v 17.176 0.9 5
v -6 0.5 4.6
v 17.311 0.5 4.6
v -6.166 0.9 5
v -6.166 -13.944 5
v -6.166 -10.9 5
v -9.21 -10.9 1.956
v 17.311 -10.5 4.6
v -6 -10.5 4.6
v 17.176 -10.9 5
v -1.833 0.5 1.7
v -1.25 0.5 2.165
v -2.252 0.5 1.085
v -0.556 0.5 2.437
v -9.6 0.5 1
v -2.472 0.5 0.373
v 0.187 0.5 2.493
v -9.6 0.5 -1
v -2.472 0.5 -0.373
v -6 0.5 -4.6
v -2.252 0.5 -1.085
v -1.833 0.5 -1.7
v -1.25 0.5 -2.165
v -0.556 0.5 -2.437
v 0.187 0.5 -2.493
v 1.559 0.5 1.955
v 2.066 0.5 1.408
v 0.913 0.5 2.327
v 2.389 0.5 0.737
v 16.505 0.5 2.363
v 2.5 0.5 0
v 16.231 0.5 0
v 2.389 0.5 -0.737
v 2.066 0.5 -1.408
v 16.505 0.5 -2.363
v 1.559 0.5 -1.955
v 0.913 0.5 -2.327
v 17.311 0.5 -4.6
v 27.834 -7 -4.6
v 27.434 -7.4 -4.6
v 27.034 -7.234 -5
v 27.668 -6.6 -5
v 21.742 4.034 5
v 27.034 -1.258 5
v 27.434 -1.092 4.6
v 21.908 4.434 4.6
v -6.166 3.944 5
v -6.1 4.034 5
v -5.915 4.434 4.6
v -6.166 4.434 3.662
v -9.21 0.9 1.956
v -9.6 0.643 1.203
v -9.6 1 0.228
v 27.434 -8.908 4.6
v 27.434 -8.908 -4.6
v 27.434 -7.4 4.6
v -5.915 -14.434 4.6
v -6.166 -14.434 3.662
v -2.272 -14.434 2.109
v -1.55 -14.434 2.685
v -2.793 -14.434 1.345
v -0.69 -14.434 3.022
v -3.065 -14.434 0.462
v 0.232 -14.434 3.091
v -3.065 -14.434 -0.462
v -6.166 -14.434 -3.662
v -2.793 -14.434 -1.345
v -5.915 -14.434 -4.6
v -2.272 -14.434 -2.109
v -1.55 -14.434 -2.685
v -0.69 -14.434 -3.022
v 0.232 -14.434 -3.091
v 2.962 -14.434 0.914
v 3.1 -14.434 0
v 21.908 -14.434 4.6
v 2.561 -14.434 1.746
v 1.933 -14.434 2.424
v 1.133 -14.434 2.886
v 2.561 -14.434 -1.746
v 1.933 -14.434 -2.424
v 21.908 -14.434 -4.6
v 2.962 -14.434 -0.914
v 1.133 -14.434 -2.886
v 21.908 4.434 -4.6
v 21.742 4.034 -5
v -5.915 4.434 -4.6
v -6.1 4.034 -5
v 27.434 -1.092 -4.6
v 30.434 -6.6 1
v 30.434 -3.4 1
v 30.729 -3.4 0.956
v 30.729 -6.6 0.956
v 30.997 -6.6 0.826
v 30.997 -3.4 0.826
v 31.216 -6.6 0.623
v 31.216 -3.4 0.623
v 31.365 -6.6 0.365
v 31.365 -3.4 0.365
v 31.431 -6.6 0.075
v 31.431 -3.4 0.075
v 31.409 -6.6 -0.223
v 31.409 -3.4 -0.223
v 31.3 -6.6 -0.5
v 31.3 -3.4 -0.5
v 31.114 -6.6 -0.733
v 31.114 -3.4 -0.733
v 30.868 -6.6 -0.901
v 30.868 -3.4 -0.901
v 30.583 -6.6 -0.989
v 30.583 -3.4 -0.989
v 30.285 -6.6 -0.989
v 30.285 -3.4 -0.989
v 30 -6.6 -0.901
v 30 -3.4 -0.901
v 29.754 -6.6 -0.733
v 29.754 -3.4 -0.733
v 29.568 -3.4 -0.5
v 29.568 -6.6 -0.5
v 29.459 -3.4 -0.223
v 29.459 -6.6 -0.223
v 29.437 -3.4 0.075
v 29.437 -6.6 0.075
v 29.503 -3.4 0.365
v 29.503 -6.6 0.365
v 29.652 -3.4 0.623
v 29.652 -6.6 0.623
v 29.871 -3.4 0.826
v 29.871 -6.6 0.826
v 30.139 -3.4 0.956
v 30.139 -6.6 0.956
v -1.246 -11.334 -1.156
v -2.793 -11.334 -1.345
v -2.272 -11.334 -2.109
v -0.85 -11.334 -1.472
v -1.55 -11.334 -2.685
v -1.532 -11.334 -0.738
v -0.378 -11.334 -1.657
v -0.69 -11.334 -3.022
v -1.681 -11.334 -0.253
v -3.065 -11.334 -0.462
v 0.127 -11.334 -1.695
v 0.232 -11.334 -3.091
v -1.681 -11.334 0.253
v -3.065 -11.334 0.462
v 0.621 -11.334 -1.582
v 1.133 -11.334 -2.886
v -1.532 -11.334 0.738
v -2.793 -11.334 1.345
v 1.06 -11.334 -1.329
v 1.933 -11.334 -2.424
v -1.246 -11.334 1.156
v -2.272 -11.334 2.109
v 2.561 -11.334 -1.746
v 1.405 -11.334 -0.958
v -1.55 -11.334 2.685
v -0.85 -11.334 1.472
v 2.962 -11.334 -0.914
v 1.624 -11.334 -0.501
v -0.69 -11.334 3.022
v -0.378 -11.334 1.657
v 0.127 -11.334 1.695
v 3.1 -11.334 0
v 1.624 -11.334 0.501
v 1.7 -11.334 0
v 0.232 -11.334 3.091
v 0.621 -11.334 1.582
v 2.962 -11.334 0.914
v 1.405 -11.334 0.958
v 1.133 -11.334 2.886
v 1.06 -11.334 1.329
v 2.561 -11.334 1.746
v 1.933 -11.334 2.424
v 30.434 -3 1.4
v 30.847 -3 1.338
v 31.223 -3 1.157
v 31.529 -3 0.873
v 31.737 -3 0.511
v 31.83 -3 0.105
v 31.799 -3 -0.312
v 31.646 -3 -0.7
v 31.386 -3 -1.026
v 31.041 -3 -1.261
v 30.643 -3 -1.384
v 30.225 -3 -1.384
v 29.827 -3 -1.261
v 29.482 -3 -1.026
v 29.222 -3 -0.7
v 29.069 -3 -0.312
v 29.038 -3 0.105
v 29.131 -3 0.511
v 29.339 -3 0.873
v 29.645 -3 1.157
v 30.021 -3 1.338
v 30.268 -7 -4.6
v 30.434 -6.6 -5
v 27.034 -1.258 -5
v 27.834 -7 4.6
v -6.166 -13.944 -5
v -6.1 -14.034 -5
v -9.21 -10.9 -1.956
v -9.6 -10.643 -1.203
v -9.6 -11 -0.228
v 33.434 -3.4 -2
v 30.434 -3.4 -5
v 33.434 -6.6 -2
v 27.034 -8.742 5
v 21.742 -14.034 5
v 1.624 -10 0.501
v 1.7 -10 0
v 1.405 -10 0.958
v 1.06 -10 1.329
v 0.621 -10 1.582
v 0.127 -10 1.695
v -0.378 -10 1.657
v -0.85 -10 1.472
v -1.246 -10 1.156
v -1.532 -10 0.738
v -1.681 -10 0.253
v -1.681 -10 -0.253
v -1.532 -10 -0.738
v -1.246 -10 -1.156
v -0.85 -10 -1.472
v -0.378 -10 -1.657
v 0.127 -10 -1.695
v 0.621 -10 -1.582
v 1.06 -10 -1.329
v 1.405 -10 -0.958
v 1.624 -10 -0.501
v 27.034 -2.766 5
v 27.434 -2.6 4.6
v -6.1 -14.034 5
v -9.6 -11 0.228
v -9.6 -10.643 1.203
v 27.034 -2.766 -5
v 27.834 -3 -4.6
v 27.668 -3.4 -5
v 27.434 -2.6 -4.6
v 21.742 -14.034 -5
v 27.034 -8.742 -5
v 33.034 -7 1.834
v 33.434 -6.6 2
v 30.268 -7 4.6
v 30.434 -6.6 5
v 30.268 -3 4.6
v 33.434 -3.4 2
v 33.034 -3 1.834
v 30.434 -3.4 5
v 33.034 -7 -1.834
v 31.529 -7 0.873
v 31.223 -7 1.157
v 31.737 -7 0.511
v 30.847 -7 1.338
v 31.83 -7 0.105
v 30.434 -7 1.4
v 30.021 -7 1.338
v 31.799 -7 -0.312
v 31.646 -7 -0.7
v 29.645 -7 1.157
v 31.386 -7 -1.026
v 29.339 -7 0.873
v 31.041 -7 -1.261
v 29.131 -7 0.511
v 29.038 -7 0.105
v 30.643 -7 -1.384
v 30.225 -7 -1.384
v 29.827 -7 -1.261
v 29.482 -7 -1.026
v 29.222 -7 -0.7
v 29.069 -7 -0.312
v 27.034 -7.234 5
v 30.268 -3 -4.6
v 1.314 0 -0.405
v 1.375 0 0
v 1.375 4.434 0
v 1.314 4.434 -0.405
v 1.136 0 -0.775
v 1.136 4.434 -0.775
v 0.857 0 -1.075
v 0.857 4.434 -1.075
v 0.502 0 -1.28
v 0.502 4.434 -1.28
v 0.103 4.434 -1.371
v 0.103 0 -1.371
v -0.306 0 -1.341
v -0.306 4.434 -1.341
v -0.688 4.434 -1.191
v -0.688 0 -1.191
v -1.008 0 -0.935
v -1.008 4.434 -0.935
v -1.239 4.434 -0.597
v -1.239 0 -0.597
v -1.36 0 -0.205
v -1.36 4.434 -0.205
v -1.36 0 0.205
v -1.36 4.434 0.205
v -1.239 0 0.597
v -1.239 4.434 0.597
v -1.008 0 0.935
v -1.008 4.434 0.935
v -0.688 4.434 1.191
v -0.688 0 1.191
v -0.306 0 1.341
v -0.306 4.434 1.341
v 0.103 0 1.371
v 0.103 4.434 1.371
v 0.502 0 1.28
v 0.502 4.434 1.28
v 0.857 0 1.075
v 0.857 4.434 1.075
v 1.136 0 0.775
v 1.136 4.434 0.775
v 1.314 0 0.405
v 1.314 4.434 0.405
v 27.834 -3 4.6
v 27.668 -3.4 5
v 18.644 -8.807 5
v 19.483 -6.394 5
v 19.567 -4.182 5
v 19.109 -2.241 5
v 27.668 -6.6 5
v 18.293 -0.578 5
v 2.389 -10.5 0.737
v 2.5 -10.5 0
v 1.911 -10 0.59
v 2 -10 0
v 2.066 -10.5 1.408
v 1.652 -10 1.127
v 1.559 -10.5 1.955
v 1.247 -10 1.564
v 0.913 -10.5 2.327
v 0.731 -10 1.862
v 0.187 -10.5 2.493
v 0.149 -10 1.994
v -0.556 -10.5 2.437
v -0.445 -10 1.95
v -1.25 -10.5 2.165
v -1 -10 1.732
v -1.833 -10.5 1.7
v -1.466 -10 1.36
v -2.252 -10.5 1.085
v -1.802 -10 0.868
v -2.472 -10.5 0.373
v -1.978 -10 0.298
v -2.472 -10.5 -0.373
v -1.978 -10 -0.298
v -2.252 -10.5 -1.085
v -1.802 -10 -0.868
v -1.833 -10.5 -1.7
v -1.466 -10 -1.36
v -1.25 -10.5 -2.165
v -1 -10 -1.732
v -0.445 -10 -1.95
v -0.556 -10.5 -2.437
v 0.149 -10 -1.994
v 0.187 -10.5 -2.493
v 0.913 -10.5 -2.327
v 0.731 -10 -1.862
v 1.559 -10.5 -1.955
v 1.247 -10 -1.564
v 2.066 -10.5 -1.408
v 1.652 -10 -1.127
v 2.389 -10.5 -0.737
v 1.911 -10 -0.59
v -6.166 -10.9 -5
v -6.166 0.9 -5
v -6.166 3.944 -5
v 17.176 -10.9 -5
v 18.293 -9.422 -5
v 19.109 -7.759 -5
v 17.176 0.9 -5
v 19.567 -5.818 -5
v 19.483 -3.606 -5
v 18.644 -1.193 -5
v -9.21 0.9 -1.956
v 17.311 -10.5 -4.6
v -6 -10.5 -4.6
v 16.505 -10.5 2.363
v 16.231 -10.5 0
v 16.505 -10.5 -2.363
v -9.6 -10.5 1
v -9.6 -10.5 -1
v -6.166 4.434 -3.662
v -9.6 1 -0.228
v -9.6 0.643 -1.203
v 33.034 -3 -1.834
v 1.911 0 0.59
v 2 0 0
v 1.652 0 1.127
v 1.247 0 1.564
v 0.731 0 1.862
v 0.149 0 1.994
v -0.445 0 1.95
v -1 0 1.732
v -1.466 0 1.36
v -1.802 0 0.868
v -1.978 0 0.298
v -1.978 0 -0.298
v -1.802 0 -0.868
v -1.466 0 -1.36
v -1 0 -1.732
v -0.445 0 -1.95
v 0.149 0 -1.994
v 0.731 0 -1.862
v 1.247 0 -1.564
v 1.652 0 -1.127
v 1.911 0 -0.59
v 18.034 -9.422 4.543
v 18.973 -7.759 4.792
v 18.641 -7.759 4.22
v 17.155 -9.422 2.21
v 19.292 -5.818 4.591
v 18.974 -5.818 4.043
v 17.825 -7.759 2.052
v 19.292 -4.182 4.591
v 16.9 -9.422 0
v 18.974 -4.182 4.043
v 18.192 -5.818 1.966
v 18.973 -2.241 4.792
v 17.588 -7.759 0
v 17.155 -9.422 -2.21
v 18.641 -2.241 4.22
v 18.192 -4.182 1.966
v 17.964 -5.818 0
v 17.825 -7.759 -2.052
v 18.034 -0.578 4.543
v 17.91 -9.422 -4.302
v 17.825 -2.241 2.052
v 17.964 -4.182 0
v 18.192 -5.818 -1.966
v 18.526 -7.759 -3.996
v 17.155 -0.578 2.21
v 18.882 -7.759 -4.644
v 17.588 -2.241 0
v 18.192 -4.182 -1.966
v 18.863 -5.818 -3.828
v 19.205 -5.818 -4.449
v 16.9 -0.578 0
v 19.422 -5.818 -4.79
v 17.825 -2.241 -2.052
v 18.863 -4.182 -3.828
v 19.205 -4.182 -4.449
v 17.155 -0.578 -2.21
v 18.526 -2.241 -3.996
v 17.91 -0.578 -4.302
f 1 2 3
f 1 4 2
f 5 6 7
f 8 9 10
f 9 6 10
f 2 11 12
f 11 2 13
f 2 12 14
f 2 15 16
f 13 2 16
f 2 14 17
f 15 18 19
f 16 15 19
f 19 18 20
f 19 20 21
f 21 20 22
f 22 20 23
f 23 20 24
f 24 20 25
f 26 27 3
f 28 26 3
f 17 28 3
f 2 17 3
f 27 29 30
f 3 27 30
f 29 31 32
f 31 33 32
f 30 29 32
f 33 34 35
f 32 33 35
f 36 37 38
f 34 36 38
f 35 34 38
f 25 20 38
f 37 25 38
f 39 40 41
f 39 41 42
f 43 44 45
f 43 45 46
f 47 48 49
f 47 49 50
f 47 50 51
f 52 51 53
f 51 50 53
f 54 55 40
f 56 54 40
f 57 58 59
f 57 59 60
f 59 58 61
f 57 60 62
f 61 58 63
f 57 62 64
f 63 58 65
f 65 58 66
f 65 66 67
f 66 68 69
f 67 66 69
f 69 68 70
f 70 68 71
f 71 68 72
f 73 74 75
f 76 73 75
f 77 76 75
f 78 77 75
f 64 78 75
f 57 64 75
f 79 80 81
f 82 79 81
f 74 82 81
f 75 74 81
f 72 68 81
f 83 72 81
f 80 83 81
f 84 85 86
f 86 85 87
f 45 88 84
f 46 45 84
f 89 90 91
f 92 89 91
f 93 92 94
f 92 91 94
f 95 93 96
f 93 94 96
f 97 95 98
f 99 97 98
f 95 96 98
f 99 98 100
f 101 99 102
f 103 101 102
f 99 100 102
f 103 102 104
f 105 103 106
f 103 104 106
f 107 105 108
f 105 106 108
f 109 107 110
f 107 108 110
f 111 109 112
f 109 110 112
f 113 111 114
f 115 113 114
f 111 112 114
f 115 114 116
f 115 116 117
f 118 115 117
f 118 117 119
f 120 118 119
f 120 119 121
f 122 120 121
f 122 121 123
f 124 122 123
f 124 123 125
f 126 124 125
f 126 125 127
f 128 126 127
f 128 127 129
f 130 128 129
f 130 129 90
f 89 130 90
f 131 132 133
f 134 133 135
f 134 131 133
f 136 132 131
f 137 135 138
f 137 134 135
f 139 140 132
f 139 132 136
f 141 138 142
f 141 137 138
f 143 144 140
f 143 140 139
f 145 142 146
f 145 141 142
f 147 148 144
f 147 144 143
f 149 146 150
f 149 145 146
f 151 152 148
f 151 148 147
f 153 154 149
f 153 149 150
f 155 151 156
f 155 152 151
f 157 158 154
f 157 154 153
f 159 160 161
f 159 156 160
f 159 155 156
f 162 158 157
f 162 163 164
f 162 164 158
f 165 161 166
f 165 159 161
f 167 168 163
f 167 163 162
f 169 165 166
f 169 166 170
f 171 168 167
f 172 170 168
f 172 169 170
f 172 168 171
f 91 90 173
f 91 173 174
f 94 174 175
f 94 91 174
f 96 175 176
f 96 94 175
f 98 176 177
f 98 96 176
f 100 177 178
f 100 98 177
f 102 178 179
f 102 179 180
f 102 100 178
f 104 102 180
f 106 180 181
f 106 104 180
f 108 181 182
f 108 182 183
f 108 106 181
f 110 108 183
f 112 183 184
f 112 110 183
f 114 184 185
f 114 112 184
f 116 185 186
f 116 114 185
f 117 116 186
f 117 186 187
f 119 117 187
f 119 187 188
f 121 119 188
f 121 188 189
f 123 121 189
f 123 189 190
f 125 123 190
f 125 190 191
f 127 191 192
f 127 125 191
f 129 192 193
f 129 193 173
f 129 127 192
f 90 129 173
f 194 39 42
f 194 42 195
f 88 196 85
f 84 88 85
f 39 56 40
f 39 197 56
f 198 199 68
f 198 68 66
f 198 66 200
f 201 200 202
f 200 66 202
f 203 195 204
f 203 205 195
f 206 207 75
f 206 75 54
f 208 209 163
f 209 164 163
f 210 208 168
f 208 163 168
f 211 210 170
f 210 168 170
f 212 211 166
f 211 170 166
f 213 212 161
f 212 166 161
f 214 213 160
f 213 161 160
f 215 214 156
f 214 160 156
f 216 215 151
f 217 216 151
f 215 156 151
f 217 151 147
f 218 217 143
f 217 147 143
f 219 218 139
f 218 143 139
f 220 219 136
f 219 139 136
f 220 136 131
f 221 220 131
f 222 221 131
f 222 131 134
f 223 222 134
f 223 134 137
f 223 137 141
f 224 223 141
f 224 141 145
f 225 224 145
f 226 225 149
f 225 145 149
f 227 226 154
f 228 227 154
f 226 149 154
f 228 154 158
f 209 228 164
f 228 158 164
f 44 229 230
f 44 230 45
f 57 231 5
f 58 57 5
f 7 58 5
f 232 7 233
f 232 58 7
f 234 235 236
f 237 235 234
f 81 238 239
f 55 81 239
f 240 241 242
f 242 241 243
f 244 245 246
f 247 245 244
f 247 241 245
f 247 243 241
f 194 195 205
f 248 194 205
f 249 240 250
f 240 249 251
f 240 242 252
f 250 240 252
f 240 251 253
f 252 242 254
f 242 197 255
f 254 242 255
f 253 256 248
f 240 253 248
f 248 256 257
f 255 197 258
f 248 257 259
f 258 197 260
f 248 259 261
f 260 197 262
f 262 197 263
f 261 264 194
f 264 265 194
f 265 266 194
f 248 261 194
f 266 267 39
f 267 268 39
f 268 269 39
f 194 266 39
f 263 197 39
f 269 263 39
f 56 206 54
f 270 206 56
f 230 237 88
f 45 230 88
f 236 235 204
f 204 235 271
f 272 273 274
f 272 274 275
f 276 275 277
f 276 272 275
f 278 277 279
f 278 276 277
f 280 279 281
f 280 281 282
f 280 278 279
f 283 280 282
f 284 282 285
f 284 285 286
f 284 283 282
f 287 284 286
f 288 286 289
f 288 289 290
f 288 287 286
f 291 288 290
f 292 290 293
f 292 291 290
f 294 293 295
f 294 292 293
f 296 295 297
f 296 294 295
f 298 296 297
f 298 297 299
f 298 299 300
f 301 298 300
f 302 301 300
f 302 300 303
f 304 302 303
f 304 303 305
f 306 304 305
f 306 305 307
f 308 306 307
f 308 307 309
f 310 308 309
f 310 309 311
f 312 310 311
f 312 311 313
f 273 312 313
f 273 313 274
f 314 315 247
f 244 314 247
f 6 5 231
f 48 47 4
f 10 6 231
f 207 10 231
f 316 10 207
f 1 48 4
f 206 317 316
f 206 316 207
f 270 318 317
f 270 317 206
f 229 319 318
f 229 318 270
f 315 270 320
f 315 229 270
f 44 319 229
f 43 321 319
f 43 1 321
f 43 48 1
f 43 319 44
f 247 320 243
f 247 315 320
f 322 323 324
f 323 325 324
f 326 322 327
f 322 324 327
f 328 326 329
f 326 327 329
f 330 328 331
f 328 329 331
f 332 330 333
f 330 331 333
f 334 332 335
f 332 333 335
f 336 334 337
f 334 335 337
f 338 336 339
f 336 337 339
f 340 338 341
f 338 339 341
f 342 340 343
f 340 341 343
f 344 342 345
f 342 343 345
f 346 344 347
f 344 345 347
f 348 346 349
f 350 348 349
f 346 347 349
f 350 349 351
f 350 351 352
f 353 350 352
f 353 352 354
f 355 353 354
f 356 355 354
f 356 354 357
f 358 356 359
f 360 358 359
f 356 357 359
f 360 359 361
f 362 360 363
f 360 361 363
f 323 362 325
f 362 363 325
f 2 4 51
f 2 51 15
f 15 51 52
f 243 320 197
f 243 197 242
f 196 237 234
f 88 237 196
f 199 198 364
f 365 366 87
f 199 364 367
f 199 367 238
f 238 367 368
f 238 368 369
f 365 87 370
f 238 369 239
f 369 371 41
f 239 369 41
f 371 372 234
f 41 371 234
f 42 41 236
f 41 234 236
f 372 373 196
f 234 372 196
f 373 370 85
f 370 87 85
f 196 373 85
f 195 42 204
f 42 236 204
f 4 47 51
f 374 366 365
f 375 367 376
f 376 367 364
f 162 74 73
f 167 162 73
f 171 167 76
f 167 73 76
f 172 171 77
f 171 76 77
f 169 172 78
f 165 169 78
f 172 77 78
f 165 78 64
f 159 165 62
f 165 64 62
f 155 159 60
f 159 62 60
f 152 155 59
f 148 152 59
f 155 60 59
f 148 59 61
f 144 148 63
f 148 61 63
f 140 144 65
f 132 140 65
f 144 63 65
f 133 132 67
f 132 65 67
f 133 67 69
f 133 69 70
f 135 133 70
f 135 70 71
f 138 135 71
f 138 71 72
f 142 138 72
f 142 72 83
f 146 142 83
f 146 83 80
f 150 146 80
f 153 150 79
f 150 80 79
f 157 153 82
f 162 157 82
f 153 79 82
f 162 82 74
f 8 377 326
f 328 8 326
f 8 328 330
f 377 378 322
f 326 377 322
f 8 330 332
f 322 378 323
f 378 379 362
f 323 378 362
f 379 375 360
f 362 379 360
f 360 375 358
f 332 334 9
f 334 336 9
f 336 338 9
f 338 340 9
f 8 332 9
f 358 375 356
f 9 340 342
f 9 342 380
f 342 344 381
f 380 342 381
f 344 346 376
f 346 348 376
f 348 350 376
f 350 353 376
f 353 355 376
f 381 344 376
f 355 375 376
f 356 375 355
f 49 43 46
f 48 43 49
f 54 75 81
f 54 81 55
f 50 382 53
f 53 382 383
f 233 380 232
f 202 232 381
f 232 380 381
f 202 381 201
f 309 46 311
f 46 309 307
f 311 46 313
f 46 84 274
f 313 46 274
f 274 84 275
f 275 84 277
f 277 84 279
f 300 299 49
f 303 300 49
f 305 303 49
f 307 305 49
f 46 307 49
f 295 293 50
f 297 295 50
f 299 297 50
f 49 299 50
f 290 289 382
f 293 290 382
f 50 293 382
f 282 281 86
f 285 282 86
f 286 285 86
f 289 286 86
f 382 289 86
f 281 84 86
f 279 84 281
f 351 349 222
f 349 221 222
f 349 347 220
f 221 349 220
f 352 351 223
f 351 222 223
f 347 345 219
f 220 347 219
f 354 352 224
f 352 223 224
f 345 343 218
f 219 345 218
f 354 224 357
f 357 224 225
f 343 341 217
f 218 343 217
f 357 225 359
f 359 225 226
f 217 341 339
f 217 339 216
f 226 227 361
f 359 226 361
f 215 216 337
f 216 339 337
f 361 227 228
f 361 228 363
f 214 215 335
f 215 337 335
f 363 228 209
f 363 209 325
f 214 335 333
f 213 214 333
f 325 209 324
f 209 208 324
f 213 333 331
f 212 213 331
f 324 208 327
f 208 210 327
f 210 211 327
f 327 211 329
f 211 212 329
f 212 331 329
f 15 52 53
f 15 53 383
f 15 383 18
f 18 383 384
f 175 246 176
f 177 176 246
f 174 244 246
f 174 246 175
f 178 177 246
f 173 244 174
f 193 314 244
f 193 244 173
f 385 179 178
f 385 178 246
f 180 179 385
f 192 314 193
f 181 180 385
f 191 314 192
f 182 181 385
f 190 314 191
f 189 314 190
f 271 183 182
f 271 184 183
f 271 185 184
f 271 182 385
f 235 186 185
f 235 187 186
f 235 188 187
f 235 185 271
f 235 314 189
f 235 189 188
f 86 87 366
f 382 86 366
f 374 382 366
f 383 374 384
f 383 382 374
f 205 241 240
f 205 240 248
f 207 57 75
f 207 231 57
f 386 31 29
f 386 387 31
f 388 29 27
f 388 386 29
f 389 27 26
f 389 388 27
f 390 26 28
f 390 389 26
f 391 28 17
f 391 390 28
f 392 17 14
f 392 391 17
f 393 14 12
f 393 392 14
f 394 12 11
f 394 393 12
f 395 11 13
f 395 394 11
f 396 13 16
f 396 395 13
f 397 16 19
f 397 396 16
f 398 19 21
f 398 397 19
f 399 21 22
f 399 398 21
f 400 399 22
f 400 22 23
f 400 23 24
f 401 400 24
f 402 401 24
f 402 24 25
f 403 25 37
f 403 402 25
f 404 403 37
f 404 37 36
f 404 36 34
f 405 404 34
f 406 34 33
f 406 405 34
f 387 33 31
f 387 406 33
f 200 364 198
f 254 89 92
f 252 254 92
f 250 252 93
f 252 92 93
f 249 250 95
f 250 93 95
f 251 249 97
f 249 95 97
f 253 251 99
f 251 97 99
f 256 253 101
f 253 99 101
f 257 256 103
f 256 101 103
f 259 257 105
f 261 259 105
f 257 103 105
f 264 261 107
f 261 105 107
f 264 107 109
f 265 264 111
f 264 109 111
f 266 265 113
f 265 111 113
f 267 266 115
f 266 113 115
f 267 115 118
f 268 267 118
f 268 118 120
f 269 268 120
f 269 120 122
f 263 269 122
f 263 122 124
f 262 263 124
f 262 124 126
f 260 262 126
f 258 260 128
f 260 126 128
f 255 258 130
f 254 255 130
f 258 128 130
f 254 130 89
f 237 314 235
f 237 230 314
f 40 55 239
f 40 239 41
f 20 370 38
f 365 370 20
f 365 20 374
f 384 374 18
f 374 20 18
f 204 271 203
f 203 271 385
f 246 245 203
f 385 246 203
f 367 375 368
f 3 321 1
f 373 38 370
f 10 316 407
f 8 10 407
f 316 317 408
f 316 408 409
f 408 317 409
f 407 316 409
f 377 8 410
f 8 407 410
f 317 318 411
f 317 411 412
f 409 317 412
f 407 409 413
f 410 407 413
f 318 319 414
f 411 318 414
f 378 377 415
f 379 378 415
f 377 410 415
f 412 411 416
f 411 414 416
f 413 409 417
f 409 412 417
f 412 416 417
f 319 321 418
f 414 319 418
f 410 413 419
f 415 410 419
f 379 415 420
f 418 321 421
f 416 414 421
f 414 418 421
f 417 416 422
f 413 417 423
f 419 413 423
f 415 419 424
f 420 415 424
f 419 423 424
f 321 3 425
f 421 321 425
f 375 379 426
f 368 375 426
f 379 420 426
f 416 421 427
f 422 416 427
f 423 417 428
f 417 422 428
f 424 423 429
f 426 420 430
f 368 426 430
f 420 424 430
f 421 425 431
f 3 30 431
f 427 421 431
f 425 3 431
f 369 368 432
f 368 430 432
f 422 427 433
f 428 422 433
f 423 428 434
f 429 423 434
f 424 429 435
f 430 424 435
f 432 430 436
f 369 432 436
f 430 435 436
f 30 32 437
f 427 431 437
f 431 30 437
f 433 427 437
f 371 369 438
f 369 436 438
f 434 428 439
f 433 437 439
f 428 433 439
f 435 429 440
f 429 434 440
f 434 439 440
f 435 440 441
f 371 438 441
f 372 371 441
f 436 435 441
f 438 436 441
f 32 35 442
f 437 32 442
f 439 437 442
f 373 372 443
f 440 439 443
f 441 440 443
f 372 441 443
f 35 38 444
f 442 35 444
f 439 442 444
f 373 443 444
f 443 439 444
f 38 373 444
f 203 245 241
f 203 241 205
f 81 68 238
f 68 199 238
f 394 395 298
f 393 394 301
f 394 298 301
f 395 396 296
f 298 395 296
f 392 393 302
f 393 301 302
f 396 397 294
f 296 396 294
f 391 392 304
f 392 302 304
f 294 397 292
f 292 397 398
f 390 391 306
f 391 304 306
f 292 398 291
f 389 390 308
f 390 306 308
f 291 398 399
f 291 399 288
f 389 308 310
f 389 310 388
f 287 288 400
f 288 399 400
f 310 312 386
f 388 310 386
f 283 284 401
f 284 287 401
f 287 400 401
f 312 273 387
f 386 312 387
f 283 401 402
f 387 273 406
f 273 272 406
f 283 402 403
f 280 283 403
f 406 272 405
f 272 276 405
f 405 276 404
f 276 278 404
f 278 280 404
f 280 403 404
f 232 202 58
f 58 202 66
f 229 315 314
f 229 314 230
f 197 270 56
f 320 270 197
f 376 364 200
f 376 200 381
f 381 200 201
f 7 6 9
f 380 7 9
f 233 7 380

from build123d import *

# Parameters (mm, degrees)
BOSS_EXTRUDE1_DEPTH      = 5
BOSS_EXTRUDE1_DEPTH_BACK = 5
CUT_EXTRUDE1_DEPTH       = 34.669323141
CUT_EXTRUDE1_DEPTH_BACK  = 34.669323141
SKETCH2_R                = 1.375
CUT_EXTRUDE2_REACH       = 35.669
SKETCH3_R                = 1.7
SKETCH4_R                = 3.1
CUT_EXTRUDE3_DEPTH       = 3.1
CHAMFER1_SIZE            = 3.43398
CUT_EXTRUDE4_START       = -5
CUT_EXTRUDE4_DEPTH       = 10
CHAMFER2_SIZE            = 0.4
CHAMFER3_SIZE            = 0.4
CHAMFER3_EDGE_2_SIZE     = 0.4
CHAMFER3_EDGE_2_SIZE2    = 1.092820323
CHAMFER3_EDGE_3_SIZE     = 0.4
CHAMFER3_EDGE_3_SIZE2    = 1.092820323
CHAMFER3_EDGE_4_SIZE     = 0.4
CHAMFER3_EDGE_5_SIZE     = 0.4
CHAMFER3_EDGE_6_SIZE     = 0.4
CHAMFER3_EDGE_7_SIZE     = 0.4
CHAMFER3_EDGE_7_SIZE2    = 1.092820323
CHAMFER3_EDGE_8_SIZE     = 0.4
CHAMFER3_EDGE_8_SIZE2    = 1.092820323
SKETCH9_W                = 10
SKETCH9_H                = 4
BOSS_EXTRUDE3_DEPTH      = 6
CUT_EXTRUDE5_REACH       = 37.687
SKETCH10_R               = 1
CHAMFER4_SIZE            = 0.4
CHAMFER5_SIZE            = 3
CHAMFER6_SIZE            = 0.4
MOVE_FACE1_OUTLINE_R     = 1.7
MOVE_FACE1_OUTLINE_R_2   = 1.375
MOVE_FACE1_DEPTH         = 0.5


# Read off the part's stored shape, not the designer's step: Move Face1
with BuildPart() as part:
    # Sketch1 → Boss-Extrude1 (new, two sides: drawn at the far end of the back side and taken through both)
    with BuildSketch(Plane.XY.offset(-BOSS_EXTRUDE1_DEPTH_BACK)):
        Polygon((27.433981132, -1.092317068), (21.907682932, 4.433981132), (-6.166018868, 4.433981132), (-9.6, 1), (-9.6, 0.5), (11.1, 0.5), (11.1, -10.5), (-9.6, -10.5), (-9.6, -11), (-6.166018868, -14.433981132), (21.907682932, -14.433981132), (27.433981132, -8.907682932), align=None)
    extrude(amount=BOSS_EXTRUDE1_DEPTH + BOSS_EXTRUDE1_DEPTH_BACK)

    # Sketch2 → Cut-Extrude1 (cut, two sides: drawn at the far end of the back side and taken through both)
    with BuildSketch(Plane.XZ.offset(14.433981132).offset(-CUT_EXTRUDE1_DEPTH_BACK)):
        Circle(SKETCH2_R)
    extrude(amount=CUT_EXTRUDE1_DEPTH + CUT_EXTRUDE1_DEPTH_BACK, mode=Mode.SUBTRACT)

    # Sketch3 → Cut-Extrude2 (cut, up to next)
    with BuildSketch(Plane.XZ.offset(14.433981132), mode=Mode.PRIVATE) as cut_extrude2_sk1:
        Circle(SKETCH3_R)
    cut_extrude2_tool1 = extrude(cut_extrude2_sk1.sketch, amount=-CUT_EXTRUDE2_REACH, mode=Mode.PRIVATE) & part.part
    add(cut_extrude2_tool1.solids().sort_by_distance((0, -14.433981, 0))[0], mode=Mode.SUBTRACT)

    # Sketch4 → Cut-Extrude3 (cut)
    with BuildSketch(Plane.XZ.offset(14.433981132)):
        Circle(SKETCH4_R)
    extrude(amount=-CUT_EXTRUDE3_DEPTH, mode=Mode.SUBTRACT)

    # Sketch5 → Revolve1 (revolve)
    with BuildSketch(Plane.XY, mode=Mode.PRIVATE) as revolve1_sk:
        Polygon((-1.7, -10.5), (-2.5, -10.5), (-2, -10), (-1.7, -10), align=None)
    revolve1 = revolve(revolve1_sk.sketch.rotate(Axis((0, 4.433981132, 0), (0, -1, 0)), 180), axis=Axis((0, 4.433981132, 0), (0, -1, 0)))

    # Mirror1: Revolve1 across plane
    add(revolve1.mirror(Plane(origin=(0, -5, 0), x_dir=(0, 0, 1), z_dir=(0, -1, 0))))

    # Chamfer1
    chamfer1_edges = [part.edges().sort_by_distance(p)[0] for p in [
        (-9.6, 0.75, 5),
        (-9.6, 0.75, -5),
        (-9.6, -10.75, -5),
        (-9.6, -10.75, 5),
    ]]
    chamfer(chamfer1_edges, length=CHAMFER1_SIZE)

    # Sketch7 → Cut-Extrude4 (cut)
    with BuildSketch(Plane.XY.offset(CUT_EXTRUDE4_START)):
        with BuildLine():
            Line((11.1, 0.5), (11.1, -10.5))
            Line((11.1, -10.5), (16.230873726, -10.5))
            ThreePointArc((16.230873726, -10.5), (18, -5), (16.230873726, 0.5))
            Line((16.230873726, 0.5), (11.1, 0.5))
        make_face()
    extrude(amount=CUT_EXTRUDE4_DEPTH, mode=Mode.SUBTRACT)

    # Sketch7<2> → Cut-Revolve3 (revolve, cut)
    with BuildSketch(Plane.XY):
        with BuildLine():
            Line((11.1, 0.5), (11.1, -10.5))
            Line((11.1, -10.5), (16.230873726, -10.5))
            ThreePointArc((16.230873726, -10.5), (18, -5), (16.230873726, 0.5))
            Line((16.230873726, 0.5), (11.1, 0.5))
        make_face()
    revolve(axis=Axis((26.566018868, 5.861349866, 0), (0, -1, 0)), mode=Mode.SUBTRACT)

    # Chamfer2
    chamfer2_edges = [part.edges().sort_by_distance(p)[0] for p in [
        (5.677410985, -10.5, -5),
        (7.870832032, -14.433981132, -5),
        (24.670832032, -11.670832032, -5),
        (5.677410985, -10.5, 5),
        (7.870832032, -14.433981132, 5),
        (24.670832032, -11.670832032, 5),
        (24.670832032, 1.670832032, 5),
        (24.670832032, 1.670832032, -5),
        (7.870832032, 4.433981132, 5),
        (7.870832032, 4.433981132, -5),
        (5.677410985, 0.5, 5),
        (5.677410985, 0.5, -5),
    ]]
    chamfer(chamfer2_edges, length=CHAMFER2_SIZE)

    # Chamfer3
    chamfer3_edges = [part.edges().sort_by_distance(p)[0] for p in [
        (-8.08301, 0.5, 3.08301),
    ]]
    chamfer(chamfer3_edges, length=CHAMFER3_SIZE)

    # Chamfer3 edge 2
    chamfer3_edge_2_edges = [part.edges().sort_by_distance(p)[0] for p in [
        (-7.983009717, 2.616990283, 3.183010283),
    ]]
    chamfer3_edge_2_side = [part.faces().sort_by_distance(p)[0] for p in [
        (-7.458377293, 1.830066089, 3.707642707),
    ]]
    chamfer(chamfer3_edge_2_edges, length=CHAMFER3_EDGE_2_SIZE, length2=CHAMFER3_EDGE_2_SIZE2, reference=chamfer3_edge_2_side[0])

    # Chamfer3 edge 3
    chamfer3_edge_3_edges = [part.edges().sort_by_distance(p)[0] for p in [
        (-7.983009717, 2.616990283, -3.183010283),
    ]]
    chamfer3_edge_3_side = [part.faces().sort_by_distance(p)[0] for p in [
        (-7.458377293, 1.830066089, -3.707642707),
    ]]
    chamfer(chamfer3_edge_3_edges, length=CHAMFER3_EDGE_3_SIZE, length2=CHAMFER3_EDGE_3_SIZE2, reference=chamfer3_edge_3_side[0])

    # Chamfer3 edge 4
    chamfer3_edge_4_edges = [part.edges().sort_by_distance(p)[0] for p in [
        (-8.08301, 0.5, -3.08301),
    ]]
    chamfer(chamfer3_edge_4_edges, length=CHAMFER3_EDGE_4_SIZE)

    # Chamfer3 edge 5
    chamfer3_edge_5_edges = [part.edges().sort_by_distance(p)[0] for p in [
        (-8.08301, -10.5, 3.08301),
    ]]
    chamfer(chamfer3_edge_5_edges, length=CHAMFER3_EDGE_5_SIZE)

    # Chamfer3 edge 6
    chamfer3_edge_6_edges = [part.edges().sort_by_distance(p)[0] for p in [
        (-8.08301, -10.5, -3.08301),
    ]]
    chamfer(chamfer3_edge_6_edges, length=CHAMFER3_EDGE_6_SIZE)

    # Chamfer3 edge 7
    chamfer3_edge_7_edges = [part.edges().sort_by_distance(p)[0] for p in [
        (-7.983009717, -12.616990283, 3.183010283),
    ]]
    chamfer3_edge_7_side = [part.faces().sort_by_distance(p)[0] for p in [
        (-7.458377293, -11.830066089, 3.707642707),
    ]]
    chamfer(chamfer3_edge_7_edges, length=CHAMFER3_EDGE_7_SIZE, length2=CHAMFER3_EDGE_7_SIZE2, reference=chamfer3_edge_7_side[0])

    # Chamfer3 edge 8
    chamfer3_edge_8_edges = [part.edges().sort_by_distance(p)[0] for p in [
        (-7.983009717, -12.616990283, -3.183010283),
    ]]
    chamfer3_edge_8_side = [part.faces().sort_by_distance(p)[0] for p in [
        (-7.458377293, -11.830066089, -3.707642707),
    ]]
    chamfer(chamfer3_edge_8_edges, length=CHAMFER3_EDGE_8_SIZE, length2=CHAMFER3_EDGE_8_SIZE2, reference=chamfer3_edge_8_side[0])

    # Sketch9 → Boss-Extrude3 (add)
    with BuildSketch(Plane(origin=(27.433981132, 0, 0), x_dir=(0, 0, -1), z_dir=(1, 0, 0))):
        with Locations((0, -5)):
            Rectangle(SKETCH9_W, SKETCH9_H)
    extrude(amount=BOSS_EXTRUDE3_DEPTH)

    # Sketch10 → Cut-Extrude5 (cut, up to next)
    with BuildSketch(Plane(origin=(0, -3, 0), x_dir=(1, 0, 0), z_dir=(0, 1, 0)), mode=Mode.PRIVATE) as cut_extrude5_sk1:
        with Locations(Location((30.433981132, 0, 0), (0, 0, 270))):
            Circle(SKETCH10_R)
    cut_extrude5_tool1 = extrude(cut_extrude5_sk1.sketch, amount=-CUT_EXTRUDE5_REACH, mode=Mode.PRIVATE) & part.part
    add(cut_extrude5_tool1.solids().sort_by_distance((30.433981, -3, 0))[0], mode=Mode.SUBTRACT)

    # Chamfer4
    chamfer4_edges = [part.edges().sort_by_distance(p)[0] for p in [
        (27.433981132, -3, 0),
        (27.433981132, -7, 0),
    ]]
    chamfer(chamfer4_edges, length=CHAMFER4_SIZE)

    # Chamfer5
    chamfer5_edges = [part.edges().sort_by_distance(p)[0] for p in [
        (33.433981132, -5, -5),
        (33.433981132, -5, 5),
    ]]
    chamfer(chamfer5_edges, length=CHAMFER5_SIZE)

    # Chamfer6
    chamfer6_edges = [part.edges().sort_by_distance(p)[0] for p in [
        (30.433981132, -3, -1),
        (30.433981132, -7, -1),
        (27.433981132, -7.870998754, 5),
        (27.633981132, -7.2, 5),
        (27.633981132, -7.2, -5),
        (29.133981132, -7, 5),
        (31.933981132, -7, 3.5),
        (33.433981132, -7, 0),
        (31.933981132, -7, -3.5),
        (27.433981132, -7.870998754, -5),
        (29.133981132, -7, -5),
        (27.433981132, -2.129001246, 5),
        (27.633981132, -2.8, -5),
        (27.633981132, -2.8, 5),
        (29.133981132, -3, 5),
        (31.933981132, -3, 3.5),
        (33.433981132, -3, 0),
        (31.933981132, -3, -3.5),
        (29.133981132, -3, -5),
        (27.433981132, -2.129001246, -5),
    ]]
    chamfer(chamfer6_edges, length=CHAMFER6_SIZE)

    # Move Face1 outline → Move Face1 (add)
    with BuildSketch(Plane(origin=(0, 0, 0), x_dir=(1, 0, 0), z_dir=(0, 1, 0))):
        Circle(MOVE_FACE1_OUTLINE_R)
        Circle(MOVE_FACE1_OUTLINE_R_2, mode=Mode.SUBTRACT)
    extrude(amount=MOVE_FACE1_DEPTH)


solid = part.part
